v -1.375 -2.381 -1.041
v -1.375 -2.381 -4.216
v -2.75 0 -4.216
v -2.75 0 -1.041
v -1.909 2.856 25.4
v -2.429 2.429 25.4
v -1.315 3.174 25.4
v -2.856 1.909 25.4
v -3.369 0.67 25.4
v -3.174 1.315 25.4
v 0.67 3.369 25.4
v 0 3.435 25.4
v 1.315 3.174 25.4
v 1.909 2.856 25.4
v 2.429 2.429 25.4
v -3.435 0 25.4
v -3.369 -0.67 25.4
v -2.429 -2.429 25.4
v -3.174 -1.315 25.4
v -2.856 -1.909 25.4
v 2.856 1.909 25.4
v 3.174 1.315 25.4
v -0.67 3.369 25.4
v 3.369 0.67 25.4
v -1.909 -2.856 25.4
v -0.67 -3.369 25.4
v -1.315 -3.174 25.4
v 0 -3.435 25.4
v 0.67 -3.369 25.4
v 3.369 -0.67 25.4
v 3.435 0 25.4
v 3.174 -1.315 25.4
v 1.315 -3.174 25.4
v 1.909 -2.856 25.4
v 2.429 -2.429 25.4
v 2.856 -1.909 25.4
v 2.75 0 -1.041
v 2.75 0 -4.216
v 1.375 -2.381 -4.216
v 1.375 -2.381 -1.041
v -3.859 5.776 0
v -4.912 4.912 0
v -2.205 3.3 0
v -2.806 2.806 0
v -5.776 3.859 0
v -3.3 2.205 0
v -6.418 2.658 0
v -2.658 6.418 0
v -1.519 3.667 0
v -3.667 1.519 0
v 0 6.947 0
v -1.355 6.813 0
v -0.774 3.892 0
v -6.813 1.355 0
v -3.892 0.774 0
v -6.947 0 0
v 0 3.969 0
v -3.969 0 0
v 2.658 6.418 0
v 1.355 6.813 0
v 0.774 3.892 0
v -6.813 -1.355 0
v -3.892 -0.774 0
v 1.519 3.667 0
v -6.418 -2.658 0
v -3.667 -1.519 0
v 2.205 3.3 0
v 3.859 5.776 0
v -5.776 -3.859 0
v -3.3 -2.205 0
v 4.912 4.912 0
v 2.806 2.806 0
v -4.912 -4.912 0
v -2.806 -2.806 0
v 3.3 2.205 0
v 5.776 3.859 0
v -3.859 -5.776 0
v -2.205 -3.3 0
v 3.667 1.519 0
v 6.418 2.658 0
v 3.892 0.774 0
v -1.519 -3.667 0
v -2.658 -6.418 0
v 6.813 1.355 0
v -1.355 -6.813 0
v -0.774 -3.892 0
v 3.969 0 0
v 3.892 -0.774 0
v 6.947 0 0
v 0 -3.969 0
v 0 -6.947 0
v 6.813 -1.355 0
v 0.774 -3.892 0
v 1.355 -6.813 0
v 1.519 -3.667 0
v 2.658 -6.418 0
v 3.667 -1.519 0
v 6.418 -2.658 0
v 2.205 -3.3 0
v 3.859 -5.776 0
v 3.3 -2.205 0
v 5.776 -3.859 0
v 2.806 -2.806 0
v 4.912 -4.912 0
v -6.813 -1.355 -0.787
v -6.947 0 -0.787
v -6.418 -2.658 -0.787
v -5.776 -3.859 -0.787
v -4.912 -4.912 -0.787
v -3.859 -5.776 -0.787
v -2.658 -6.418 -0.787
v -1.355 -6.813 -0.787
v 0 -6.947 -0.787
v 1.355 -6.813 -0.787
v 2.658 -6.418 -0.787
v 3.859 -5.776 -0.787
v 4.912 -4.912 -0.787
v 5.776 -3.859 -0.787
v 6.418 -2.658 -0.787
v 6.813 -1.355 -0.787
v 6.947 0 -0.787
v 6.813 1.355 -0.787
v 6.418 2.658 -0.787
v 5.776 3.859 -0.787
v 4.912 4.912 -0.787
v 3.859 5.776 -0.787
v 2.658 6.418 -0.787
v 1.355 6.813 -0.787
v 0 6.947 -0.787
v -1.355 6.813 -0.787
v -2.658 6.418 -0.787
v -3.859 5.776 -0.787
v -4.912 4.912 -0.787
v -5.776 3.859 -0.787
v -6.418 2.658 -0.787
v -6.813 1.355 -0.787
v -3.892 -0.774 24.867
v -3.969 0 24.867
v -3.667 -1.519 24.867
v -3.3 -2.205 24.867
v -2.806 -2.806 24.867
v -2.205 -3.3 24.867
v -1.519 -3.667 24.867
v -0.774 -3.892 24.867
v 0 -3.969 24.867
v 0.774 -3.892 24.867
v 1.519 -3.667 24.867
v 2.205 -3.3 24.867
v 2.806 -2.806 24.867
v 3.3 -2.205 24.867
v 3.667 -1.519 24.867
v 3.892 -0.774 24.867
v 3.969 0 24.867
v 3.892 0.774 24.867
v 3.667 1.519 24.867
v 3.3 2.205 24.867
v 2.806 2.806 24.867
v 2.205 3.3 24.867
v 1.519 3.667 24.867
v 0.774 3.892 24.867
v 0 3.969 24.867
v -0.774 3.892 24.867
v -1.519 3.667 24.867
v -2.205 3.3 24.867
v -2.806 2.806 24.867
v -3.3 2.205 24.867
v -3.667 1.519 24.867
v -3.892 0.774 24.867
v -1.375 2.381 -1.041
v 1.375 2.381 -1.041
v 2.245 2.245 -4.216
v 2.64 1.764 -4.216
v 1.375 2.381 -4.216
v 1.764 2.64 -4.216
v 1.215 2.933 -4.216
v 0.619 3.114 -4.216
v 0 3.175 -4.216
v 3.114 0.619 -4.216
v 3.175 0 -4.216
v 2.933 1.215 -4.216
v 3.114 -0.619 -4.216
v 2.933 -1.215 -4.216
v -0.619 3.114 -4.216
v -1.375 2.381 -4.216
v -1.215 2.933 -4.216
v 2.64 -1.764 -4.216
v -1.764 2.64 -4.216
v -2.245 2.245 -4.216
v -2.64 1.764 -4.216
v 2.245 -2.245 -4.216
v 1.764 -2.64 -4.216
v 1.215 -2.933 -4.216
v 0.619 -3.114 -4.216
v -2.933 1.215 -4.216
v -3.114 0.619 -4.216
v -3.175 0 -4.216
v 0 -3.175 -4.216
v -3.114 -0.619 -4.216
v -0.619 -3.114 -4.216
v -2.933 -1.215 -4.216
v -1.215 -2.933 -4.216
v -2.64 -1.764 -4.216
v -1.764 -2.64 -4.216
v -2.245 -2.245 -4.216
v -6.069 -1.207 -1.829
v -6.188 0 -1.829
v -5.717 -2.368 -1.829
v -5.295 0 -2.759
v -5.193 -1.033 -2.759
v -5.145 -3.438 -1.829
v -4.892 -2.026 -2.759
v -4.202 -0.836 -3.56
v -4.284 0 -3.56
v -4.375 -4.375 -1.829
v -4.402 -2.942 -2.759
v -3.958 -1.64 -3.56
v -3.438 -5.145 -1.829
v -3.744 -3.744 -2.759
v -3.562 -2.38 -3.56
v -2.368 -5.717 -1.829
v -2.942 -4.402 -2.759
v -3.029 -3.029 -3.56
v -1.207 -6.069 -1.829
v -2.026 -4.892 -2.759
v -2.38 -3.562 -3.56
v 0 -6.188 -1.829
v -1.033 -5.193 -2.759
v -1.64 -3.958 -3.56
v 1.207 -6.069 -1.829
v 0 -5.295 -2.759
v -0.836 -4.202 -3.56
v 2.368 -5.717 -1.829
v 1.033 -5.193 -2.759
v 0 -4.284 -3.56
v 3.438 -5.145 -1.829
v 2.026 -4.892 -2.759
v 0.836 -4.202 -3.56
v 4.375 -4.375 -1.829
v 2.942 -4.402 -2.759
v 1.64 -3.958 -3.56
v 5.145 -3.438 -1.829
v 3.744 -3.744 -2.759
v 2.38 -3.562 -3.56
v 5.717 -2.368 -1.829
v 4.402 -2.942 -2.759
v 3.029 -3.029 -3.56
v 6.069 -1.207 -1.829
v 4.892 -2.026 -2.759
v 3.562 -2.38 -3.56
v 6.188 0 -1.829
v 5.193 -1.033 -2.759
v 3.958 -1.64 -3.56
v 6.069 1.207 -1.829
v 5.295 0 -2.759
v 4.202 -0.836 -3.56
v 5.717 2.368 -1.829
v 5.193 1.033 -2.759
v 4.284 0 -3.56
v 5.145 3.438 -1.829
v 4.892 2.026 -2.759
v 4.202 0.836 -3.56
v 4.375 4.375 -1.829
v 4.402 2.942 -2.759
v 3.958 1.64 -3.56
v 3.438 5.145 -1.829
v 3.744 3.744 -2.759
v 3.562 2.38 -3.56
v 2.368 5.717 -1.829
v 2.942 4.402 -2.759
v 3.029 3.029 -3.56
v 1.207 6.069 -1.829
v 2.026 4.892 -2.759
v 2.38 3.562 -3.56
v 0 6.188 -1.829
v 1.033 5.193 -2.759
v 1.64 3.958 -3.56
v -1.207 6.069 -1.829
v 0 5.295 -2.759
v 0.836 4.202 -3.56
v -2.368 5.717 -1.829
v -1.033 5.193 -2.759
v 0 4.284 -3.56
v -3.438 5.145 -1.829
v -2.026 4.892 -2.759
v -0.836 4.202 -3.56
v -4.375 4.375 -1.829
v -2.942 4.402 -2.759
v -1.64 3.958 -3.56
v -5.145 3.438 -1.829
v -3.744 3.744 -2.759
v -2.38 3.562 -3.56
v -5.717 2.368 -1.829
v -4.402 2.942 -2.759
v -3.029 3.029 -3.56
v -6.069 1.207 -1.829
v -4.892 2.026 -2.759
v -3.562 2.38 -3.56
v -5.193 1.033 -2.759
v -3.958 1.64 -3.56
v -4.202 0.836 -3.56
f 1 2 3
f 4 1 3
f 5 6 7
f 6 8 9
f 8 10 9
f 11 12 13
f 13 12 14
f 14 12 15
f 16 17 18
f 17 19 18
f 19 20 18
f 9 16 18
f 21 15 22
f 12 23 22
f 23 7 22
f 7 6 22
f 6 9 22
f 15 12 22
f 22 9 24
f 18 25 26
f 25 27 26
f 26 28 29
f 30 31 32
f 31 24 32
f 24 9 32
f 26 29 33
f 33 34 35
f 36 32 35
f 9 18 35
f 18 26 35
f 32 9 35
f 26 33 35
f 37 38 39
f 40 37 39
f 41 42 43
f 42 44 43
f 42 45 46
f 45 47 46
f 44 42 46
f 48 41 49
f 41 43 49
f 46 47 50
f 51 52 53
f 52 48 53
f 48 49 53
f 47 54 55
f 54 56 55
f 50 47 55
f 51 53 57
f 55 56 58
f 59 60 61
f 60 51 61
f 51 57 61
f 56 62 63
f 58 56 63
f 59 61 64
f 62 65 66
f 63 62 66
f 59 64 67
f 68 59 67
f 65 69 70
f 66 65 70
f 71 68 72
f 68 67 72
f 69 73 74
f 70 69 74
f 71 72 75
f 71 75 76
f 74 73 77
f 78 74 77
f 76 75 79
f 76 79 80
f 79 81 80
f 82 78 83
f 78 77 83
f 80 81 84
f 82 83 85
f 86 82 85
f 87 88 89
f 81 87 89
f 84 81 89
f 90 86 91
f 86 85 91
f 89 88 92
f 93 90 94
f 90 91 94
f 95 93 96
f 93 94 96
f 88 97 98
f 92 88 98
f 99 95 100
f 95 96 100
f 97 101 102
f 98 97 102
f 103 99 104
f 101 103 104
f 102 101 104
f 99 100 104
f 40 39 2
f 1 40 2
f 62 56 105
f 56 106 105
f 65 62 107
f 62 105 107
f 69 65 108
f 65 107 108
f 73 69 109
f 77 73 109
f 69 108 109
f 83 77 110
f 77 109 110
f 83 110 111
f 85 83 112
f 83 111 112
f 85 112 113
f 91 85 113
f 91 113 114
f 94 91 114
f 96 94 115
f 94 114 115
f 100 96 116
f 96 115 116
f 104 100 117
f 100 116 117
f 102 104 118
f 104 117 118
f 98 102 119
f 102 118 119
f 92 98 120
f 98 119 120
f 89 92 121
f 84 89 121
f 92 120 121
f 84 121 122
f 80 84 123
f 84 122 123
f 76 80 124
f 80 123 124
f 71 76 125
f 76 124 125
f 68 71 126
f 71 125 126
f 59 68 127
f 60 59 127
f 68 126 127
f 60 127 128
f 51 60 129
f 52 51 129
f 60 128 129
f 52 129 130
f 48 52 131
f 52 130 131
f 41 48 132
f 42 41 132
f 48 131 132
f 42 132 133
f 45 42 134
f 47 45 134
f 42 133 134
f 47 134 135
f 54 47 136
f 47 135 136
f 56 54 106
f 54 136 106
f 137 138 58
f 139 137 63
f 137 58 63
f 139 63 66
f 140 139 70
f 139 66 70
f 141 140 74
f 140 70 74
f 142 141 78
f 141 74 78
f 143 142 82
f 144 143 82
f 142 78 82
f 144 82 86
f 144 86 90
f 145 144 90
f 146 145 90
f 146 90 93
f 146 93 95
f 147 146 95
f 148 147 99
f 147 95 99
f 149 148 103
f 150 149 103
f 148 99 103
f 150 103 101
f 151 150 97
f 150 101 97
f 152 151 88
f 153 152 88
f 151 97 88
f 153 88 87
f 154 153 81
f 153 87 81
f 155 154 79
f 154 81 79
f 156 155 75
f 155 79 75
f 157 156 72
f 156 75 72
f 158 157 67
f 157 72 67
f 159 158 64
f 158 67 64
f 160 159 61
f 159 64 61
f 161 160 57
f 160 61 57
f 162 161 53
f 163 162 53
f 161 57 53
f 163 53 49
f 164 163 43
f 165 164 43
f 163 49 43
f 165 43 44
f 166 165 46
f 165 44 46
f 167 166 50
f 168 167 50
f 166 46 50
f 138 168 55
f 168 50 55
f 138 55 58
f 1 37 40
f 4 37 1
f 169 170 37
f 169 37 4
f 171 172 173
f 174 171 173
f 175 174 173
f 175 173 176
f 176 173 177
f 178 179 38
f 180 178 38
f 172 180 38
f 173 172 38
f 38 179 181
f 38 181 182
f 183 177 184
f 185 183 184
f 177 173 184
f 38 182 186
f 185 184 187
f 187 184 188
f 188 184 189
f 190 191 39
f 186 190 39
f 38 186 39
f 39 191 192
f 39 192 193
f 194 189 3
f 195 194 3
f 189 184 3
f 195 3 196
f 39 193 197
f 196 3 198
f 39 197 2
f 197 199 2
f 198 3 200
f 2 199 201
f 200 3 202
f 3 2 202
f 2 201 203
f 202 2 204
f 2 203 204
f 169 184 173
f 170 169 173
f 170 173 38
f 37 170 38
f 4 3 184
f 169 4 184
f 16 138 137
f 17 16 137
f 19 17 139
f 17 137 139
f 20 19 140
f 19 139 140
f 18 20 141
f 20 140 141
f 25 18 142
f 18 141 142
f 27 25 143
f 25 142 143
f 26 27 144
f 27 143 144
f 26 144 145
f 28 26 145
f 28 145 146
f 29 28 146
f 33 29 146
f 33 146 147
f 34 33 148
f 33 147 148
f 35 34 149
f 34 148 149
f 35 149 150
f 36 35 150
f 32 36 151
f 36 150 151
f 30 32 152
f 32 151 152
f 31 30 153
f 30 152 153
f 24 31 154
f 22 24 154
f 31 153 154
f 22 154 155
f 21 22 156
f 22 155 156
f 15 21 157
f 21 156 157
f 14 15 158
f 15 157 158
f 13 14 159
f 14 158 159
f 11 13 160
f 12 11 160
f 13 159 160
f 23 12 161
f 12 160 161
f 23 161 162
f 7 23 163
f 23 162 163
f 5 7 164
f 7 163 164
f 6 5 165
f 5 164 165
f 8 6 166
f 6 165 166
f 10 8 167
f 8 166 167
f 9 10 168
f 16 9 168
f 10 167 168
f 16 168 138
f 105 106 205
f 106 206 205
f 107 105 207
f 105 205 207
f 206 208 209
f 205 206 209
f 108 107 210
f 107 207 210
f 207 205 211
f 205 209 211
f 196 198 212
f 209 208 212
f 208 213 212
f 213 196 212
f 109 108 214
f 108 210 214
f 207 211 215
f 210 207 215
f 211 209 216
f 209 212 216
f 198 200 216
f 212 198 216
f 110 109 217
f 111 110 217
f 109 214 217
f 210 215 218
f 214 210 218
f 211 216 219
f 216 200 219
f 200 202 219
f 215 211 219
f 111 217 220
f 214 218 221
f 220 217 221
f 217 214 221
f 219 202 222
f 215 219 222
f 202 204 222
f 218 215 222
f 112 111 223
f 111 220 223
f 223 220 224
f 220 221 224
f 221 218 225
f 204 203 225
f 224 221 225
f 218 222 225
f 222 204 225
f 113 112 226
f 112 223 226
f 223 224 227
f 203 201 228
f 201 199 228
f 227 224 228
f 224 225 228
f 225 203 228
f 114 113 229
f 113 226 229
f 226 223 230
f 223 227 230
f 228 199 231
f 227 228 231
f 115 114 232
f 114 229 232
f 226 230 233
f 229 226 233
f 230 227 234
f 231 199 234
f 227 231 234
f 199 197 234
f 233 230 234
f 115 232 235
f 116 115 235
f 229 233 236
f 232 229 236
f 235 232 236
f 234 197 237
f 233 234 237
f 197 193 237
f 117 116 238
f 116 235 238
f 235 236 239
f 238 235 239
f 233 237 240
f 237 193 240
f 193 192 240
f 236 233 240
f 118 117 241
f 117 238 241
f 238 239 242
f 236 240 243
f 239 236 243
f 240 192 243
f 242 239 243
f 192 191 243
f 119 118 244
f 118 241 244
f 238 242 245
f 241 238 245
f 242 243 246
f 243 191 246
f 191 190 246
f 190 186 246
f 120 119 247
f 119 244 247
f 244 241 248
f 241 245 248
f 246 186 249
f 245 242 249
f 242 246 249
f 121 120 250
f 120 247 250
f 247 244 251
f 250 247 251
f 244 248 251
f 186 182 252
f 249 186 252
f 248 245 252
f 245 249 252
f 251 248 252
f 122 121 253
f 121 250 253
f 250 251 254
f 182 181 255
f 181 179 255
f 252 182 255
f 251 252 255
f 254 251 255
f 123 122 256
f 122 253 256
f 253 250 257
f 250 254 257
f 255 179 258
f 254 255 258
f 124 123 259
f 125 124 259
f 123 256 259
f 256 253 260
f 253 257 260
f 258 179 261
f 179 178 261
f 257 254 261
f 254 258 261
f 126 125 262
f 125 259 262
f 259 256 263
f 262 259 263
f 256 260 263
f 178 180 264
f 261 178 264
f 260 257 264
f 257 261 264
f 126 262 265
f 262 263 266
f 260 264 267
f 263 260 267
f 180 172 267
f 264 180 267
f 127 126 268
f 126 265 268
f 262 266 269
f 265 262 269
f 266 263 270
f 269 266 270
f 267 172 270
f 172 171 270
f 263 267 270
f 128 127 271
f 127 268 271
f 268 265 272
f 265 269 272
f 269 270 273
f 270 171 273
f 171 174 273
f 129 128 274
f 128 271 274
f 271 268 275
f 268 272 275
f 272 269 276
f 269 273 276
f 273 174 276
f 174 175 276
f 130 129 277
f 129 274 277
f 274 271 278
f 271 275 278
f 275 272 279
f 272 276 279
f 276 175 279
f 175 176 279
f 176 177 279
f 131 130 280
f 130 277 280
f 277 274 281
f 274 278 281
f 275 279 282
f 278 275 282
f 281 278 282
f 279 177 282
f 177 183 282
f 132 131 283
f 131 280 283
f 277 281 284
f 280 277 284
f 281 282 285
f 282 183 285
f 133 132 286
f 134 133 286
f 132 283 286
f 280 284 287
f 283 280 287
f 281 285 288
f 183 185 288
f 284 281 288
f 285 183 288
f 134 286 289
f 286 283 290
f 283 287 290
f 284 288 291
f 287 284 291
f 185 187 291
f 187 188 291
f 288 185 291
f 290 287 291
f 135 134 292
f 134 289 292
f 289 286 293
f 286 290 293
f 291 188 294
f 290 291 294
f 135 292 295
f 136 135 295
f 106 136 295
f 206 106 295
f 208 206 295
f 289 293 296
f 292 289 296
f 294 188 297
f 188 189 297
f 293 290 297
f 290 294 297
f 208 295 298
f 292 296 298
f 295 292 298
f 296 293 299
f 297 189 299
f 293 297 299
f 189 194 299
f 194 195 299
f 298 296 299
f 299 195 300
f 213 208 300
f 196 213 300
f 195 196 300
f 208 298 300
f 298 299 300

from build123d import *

# Parameters (mm, degrees)
CUT_EXTRUDE1_DEPTH = 3.175
CHAMFER1_SIZE      = 0.5334


with BuildPart() as part:
    # Sketch1 → Revolve1 (revolve)
    with BuildSketch(Plane(origin=(0, 0, 0), x_dir=(1, 0, 0), z_dir=(0, 1, 0)), mode=Mode.PRIVATE) as revolve1_sk:
        with BuildLine():
            Line((0, 0), (0, -25.4))
            Line((0, -25.4), (3.96875, -25.4))
            Line((3.96875, -25.4), (3.96875, 0))
            Line((3.96875, 0), (6.9469, 0))
            Line((6.9469, 0), (6.9469, 0.7874))
            ThreePointArc((6.9469, 0.7874), (5.294601142, 2.758916257), (3.175, 4.2164))
            Line((3.175, 4.2164), (0, 4.2164))
            Line((0, 4.2164), (0, 0))
        make_face()
    revolve(revolve1_sk.sketch.rotate(Axis((0, 0, 0), (0, 0, 1)), 180), axis=Axis((0, 0, 0), (0, 0, 1)))

    # Sketch2 → Cut-Extrude1 (cut)
    with BuildSketch(Plane(origin=(0, 0, -4.2164), x_dir=(-1, 0, 0), z_dir=(0, 0, -1))):
        Polygon((2.749630657, 0), (1.374815329, 2.38125), (-1.374815329, 2.38125), (-2.749630657, 0), (-1.374815329, -2.38125), (1.374815329, -2.38125), align=None)
    extrude(amount=-CUT_EXTRUDE1_DEPTH, mode=Mode.SUBTRACT)

    # Chamfer1
    chamfer1_edges = [part.edges().sort_by_distance(p)[0] for p in [
        (3.96875, 0, 25.4),
    ]]
    chamfer(chamfer1_edges, length=CHAMFER1_SIZE)


solid = part.part
